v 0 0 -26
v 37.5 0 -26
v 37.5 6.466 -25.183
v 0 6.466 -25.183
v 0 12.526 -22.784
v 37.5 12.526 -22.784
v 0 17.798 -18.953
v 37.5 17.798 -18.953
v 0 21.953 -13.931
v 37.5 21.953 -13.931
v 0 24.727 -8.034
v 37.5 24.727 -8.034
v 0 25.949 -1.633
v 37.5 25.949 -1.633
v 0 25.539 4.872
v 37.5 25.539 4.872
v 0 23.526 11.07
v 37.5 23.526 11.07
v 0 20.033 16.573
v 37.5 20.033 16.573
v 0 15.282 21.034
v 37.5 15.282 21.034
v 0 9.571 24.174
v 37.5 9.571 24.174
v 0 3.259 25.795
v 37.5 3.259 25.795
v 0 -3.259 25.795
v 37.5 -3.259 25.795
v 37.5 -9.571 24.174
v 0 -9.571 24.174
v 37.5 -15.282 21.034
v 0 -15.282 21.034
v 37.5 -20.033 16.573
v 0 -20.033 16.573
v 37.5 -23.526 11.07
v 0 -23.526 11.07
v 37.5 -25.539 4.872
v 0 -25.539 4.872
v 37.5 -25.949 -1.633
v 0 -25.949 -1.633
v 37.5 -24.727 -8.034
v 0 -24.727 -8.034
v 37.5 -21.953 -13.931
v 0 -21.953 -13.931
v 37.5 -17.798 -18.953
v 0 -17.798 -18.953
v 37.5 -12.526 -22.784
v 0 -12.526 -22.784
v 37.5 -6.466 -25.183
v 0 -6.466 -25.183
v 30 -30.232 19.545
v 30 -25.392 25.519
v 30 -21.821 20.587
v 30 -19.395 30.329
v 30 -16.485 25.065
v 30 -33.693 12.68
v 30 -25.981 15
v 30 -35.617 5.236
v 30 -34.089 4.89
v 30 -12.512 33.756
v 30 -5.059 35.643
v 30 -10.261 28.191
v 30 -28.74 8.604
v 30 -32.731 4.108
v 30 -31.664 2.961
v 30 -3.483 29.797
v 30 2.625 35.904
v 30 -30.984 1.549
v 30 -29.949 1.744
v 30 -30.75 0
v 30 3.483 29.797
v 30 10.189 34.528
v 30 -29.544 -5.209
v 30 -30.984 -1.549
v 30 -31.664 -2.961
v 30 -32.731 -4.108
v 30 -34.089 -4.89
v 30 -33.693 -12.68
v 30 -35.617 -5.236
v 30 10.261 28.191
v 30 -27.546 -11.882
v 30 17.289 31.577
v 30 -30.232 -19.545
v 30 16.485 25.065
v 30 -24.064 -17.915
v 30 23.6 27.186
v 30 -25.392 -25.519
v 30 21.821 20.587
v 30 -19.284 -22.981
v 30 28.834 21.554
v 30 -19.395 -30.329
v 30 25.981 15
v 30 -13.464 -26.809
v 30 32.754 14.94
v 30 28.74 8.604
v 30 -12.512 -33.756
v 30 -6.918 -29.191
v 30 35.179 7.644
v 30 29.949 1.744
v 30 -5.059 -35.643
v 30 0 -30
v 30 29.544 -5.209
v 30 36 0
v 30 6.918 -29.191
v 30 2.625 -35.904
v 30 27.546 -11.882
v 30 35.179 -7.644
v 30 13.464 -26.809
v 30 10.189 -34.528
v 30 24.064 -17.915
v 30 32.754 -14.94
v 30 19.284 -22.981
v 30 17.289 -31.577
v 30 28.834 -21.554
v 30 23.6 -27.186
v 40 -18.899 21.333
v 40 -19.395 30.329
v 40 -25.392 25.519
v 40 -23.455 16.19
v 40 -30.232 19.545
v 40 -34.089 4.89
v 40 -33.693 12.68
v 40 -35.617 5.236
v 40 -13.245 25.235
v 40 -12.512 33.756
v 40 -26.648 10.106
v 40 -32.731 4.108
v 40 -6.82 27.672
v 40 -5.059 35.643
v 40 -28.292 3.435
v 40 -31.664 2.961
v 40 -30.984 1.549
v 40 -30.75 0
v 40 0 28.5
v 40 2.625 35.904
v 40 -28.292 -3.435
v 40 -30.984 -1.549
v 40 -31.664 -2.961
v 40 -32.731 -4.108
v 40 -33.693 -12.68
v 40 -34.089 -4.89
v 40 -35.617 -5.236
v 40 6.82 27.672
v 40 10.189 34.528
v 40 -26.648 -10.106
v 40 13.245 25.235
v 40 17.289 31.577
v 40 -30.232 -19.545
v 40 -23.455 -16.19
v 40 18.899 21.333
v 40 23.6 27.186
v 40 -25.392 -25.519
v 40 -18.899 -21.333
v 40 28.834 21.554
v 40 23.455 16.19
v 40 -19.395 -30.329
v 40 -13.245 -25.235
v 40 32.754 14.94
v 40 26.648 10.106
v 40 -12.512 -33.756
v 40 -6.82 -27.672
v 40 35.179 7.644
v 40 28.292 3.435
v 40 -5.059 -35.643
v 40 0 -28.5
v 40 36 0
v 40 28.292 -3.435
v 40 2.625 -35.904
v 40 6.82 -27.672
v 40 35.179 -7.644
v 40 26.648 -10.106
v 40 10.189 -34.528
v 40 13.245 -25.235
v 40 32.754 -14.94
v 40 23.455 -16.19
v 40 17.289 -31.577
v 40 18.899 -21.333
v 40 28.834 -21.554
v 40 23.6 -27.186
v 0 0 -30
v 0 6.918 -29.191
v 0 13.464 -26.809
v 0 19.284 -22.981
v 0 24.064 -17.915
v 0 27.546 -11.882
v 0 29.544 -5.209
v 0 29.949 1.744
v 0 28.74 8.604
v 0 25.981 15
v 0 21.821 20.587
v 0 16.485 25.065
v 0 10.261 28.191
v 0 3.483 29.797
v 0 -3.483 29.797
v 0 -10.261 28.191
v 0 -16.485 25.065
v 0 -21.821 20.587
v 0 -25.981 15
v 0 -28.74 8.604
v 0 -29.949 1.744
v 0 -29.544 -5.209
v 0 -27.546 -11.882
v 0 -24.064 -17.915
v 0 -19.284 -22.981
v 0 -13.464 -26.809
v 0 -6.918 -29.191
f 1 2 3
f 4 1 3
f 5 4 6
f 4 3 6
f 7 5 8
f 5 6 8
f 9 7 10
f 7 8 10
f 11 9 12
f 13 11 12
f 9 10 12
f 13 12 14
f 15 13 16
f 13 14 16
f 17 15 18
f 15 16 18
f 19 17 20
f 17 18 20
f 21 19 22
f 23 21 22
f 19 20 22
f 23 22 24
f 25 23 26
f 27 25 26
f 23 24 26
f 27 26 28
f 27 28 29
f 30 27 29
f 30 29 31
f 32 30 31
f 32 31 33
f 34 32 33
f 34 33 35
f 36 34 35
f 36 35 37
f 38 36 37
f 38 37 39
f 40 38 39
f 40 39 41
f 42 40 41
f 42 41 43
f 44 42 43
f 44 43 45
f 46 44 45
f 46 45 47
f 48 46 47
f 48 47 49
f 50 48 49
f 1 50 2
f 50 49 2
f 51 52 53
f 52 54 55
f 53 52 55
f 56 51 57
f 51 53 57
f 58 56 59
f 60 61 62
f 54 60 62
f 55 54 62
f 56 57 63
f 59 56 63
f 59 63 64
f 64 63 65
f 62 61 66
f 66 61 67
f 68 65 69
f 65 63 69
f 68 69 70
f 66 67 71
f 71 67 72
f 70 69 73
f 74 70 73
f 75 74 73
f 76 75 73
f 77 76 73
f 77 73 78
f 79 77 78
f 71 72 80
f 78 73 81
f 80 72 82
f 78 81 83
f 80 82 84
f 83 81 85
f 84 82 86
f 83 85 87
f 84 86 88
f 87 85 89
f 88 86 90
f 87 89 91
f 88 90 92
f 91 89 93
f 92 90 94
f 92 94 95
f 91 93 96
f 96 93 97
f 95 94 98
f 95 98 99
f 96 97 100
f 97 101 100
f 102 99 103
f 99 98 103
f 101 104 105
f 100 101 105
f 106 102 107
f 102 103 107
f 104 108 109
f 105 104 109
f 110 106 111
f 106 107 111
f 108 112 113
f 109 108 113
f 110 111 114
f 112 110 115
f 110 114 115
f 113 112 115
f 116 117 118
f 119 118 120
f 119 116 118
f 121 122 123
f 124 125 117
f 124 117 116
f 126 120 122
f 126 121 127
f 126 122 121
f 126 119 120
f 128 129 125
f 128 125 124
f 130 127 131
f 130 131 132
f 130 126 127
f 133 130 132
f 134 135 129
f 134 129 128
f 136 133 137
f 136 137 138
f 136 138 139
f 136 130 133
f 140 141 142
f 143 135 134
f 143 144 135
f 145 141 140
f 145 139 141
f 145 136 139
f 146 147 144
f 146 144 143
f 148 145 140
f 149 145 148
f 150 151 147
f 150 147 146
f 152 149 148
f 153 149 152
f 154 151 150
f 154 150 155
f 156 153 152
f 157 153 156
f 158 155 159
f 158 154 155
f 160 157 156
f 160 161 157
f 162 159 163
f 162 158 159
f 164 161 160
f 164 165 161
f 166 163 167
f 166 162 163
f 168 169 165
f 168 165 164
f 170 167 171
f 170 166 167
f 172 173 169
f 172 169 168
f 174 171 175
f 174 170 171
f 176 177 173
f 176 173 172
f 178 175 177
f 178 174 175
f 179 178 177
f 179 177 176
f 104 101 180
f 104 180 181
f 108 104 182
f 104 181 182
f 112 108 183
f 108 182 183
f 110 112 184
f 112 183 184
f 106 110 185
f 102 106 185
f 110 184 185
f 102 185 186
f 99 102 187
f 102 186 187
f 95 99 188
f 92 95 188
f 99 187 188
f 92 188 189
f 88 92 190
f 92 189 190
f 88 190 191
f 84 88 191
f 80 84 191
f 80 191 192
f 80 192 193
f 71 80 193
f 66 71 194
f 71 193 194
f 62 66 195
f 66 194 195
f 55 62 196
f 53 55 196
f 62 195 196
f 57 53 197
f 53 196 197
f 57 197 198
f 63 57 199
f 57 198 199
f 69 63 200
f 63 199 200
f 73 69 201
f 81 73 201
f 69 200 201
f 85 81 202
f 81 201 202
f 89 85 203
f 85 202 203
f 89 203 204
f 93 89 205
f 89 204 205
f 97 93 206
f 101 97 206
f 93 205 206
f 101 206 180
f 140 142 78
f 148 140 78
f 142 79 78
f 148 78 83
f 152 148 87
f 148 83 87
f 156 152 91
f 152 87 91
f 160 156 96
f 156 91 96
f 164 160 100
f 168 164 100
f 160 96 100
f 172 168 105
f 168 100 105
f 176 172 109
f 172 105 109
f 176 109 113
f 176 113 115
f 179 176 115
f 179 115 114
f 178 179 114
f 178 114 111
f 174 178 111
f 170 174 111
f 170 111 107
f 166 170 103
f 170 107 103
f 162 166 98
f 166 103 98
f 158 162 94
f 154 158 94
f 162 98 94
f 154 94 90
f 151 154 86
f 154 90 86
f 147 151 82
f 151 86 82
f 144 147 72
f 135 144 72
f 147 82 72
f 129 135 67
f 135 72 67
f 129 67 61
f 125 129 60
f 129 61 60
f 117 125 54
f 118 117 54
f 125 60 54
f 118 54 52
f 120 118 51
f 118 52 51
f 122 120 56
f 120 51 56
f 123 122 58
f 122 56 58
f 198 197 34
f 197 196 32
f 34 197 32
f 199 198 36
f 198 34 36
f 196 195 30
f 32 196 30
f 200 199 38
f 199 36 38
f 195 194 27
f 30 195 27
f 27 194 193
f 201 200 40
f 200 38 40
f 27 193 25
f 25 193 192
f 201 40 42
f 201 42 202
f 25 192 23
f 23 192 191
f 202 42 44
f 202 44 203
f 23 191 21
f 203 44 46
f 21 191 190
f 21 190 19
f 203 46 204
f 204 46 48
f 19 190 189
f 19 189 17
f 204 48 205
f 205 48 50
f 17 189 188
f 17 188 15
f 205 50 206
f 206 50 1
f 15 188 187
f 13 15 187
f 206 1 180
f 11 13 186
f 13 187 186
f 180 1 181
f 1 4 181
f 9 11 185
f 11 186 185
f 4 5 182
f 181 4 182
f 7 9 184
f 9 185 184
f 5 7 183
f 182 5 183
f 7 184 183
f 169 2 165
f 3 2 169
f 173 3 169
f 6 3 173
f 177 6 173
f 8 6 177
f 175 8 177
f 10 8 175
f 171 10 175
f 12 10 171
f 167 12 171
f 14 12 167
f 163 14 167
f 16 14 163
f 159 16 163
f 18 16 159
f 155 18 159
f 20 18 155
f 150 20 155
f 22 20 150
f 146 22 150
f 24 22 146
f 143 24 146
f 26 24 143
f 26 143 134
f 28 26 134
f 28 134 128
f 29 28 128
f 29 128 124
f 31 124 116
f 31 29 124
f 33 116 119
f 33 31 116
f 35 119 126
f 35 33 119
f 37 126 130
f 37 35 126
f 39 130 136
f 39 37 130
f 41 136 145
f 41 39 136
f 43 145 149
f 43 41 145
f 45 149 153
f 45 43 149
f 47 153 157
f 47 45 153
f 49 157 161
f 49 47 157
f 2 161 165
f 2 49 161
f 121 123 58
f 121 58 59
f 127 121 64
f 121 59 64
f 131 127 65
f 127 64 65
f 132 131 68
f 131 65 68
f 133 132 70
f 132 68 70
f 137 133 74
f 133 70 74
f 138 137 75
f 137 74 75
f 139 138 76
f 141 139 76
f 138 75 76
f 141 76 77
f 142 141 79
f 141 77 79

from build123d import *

# Parameters (mm, degrees)
SKETCH2_R             = 30
BOSS_EXTRUDE1_DEPTH   = 30
SKETCH3_R             = 36
BOSS_EXTRUDE2_DEPTH   = 10
SKETCH4_R             = 26
CUT_EXTRUDE1_DEPTH    = 65.745656225
CHAMFER1_SIZE         = 2.5
D_GAGEMENT_M101_D     = 10.5
D_GAGEMENT_M101_DEPTH = 20
D_GAGEMENT_M101_TIP   = 3.15451825


with BuildPart() as part:
    # Sketch2 → Boss-Extrude1 (new body)
    with BuildSketch(Plane(origin=(0, 0, 0), x_dir=(0, 0, -1), z_dir=(1, 0, 0))):
        Circle(SKETCH2_R)
    extrude(amount=BOSS_EXTRUDE1_DEPTH)

    # Sketch3 → Boss-Extrude2 (add)
    with BuildSketch(Plane(origin=(30, 0, 0), x_dir=(0, 0, -1), z_dir=(1, 0, 0))):
        Circle(SKETCH3_R)
    extrude(amount=BOSS_EXTRUDE2_DEPTH)

    # Sketch4 → Cut-Extrude1 (cut, through all)
    with BuildSketch(Plane(origin=(40, 0, 0), x_dir=(0, 0, -1), z_dir=(1, 0, 0))):
        Circle(SKETCH4_R)
    extrude(amount=-CUT_EXTRUDE1_DEPTH, mode=Mode.SUBTRACT)

    # Chamfer1
    chamfer1_edges = [part.edges().sort_by_distance(p)[0] for p in [
        (40, 0, 26),
    ]]
    chamfer(chamfer1_edges, length=CHAMFER1_SIZE)

    # Dégagement M101
    with Locations(Plane(origin=(40, 0, 0), x_dir=(0, 0, -1), z_dir=(1, 0, 0))):
        with Locations((0, -36)):
            Hole(D_GAGEMENT_M101_D / 2, depth=D_GAGEMENT_M101_DEPTH)
            with Locations((0, 0, -(D_GAGEMENT_M101_DEPTH + D_GAGEMENT_M101_TIP / 2))):  # 118° drill point
                Cone(0, D_GAGEMENT_M101_D / 2, D_GAGEMENT_M101_TIP, mode=Mode.SUBTRACT)


solid = part.part
